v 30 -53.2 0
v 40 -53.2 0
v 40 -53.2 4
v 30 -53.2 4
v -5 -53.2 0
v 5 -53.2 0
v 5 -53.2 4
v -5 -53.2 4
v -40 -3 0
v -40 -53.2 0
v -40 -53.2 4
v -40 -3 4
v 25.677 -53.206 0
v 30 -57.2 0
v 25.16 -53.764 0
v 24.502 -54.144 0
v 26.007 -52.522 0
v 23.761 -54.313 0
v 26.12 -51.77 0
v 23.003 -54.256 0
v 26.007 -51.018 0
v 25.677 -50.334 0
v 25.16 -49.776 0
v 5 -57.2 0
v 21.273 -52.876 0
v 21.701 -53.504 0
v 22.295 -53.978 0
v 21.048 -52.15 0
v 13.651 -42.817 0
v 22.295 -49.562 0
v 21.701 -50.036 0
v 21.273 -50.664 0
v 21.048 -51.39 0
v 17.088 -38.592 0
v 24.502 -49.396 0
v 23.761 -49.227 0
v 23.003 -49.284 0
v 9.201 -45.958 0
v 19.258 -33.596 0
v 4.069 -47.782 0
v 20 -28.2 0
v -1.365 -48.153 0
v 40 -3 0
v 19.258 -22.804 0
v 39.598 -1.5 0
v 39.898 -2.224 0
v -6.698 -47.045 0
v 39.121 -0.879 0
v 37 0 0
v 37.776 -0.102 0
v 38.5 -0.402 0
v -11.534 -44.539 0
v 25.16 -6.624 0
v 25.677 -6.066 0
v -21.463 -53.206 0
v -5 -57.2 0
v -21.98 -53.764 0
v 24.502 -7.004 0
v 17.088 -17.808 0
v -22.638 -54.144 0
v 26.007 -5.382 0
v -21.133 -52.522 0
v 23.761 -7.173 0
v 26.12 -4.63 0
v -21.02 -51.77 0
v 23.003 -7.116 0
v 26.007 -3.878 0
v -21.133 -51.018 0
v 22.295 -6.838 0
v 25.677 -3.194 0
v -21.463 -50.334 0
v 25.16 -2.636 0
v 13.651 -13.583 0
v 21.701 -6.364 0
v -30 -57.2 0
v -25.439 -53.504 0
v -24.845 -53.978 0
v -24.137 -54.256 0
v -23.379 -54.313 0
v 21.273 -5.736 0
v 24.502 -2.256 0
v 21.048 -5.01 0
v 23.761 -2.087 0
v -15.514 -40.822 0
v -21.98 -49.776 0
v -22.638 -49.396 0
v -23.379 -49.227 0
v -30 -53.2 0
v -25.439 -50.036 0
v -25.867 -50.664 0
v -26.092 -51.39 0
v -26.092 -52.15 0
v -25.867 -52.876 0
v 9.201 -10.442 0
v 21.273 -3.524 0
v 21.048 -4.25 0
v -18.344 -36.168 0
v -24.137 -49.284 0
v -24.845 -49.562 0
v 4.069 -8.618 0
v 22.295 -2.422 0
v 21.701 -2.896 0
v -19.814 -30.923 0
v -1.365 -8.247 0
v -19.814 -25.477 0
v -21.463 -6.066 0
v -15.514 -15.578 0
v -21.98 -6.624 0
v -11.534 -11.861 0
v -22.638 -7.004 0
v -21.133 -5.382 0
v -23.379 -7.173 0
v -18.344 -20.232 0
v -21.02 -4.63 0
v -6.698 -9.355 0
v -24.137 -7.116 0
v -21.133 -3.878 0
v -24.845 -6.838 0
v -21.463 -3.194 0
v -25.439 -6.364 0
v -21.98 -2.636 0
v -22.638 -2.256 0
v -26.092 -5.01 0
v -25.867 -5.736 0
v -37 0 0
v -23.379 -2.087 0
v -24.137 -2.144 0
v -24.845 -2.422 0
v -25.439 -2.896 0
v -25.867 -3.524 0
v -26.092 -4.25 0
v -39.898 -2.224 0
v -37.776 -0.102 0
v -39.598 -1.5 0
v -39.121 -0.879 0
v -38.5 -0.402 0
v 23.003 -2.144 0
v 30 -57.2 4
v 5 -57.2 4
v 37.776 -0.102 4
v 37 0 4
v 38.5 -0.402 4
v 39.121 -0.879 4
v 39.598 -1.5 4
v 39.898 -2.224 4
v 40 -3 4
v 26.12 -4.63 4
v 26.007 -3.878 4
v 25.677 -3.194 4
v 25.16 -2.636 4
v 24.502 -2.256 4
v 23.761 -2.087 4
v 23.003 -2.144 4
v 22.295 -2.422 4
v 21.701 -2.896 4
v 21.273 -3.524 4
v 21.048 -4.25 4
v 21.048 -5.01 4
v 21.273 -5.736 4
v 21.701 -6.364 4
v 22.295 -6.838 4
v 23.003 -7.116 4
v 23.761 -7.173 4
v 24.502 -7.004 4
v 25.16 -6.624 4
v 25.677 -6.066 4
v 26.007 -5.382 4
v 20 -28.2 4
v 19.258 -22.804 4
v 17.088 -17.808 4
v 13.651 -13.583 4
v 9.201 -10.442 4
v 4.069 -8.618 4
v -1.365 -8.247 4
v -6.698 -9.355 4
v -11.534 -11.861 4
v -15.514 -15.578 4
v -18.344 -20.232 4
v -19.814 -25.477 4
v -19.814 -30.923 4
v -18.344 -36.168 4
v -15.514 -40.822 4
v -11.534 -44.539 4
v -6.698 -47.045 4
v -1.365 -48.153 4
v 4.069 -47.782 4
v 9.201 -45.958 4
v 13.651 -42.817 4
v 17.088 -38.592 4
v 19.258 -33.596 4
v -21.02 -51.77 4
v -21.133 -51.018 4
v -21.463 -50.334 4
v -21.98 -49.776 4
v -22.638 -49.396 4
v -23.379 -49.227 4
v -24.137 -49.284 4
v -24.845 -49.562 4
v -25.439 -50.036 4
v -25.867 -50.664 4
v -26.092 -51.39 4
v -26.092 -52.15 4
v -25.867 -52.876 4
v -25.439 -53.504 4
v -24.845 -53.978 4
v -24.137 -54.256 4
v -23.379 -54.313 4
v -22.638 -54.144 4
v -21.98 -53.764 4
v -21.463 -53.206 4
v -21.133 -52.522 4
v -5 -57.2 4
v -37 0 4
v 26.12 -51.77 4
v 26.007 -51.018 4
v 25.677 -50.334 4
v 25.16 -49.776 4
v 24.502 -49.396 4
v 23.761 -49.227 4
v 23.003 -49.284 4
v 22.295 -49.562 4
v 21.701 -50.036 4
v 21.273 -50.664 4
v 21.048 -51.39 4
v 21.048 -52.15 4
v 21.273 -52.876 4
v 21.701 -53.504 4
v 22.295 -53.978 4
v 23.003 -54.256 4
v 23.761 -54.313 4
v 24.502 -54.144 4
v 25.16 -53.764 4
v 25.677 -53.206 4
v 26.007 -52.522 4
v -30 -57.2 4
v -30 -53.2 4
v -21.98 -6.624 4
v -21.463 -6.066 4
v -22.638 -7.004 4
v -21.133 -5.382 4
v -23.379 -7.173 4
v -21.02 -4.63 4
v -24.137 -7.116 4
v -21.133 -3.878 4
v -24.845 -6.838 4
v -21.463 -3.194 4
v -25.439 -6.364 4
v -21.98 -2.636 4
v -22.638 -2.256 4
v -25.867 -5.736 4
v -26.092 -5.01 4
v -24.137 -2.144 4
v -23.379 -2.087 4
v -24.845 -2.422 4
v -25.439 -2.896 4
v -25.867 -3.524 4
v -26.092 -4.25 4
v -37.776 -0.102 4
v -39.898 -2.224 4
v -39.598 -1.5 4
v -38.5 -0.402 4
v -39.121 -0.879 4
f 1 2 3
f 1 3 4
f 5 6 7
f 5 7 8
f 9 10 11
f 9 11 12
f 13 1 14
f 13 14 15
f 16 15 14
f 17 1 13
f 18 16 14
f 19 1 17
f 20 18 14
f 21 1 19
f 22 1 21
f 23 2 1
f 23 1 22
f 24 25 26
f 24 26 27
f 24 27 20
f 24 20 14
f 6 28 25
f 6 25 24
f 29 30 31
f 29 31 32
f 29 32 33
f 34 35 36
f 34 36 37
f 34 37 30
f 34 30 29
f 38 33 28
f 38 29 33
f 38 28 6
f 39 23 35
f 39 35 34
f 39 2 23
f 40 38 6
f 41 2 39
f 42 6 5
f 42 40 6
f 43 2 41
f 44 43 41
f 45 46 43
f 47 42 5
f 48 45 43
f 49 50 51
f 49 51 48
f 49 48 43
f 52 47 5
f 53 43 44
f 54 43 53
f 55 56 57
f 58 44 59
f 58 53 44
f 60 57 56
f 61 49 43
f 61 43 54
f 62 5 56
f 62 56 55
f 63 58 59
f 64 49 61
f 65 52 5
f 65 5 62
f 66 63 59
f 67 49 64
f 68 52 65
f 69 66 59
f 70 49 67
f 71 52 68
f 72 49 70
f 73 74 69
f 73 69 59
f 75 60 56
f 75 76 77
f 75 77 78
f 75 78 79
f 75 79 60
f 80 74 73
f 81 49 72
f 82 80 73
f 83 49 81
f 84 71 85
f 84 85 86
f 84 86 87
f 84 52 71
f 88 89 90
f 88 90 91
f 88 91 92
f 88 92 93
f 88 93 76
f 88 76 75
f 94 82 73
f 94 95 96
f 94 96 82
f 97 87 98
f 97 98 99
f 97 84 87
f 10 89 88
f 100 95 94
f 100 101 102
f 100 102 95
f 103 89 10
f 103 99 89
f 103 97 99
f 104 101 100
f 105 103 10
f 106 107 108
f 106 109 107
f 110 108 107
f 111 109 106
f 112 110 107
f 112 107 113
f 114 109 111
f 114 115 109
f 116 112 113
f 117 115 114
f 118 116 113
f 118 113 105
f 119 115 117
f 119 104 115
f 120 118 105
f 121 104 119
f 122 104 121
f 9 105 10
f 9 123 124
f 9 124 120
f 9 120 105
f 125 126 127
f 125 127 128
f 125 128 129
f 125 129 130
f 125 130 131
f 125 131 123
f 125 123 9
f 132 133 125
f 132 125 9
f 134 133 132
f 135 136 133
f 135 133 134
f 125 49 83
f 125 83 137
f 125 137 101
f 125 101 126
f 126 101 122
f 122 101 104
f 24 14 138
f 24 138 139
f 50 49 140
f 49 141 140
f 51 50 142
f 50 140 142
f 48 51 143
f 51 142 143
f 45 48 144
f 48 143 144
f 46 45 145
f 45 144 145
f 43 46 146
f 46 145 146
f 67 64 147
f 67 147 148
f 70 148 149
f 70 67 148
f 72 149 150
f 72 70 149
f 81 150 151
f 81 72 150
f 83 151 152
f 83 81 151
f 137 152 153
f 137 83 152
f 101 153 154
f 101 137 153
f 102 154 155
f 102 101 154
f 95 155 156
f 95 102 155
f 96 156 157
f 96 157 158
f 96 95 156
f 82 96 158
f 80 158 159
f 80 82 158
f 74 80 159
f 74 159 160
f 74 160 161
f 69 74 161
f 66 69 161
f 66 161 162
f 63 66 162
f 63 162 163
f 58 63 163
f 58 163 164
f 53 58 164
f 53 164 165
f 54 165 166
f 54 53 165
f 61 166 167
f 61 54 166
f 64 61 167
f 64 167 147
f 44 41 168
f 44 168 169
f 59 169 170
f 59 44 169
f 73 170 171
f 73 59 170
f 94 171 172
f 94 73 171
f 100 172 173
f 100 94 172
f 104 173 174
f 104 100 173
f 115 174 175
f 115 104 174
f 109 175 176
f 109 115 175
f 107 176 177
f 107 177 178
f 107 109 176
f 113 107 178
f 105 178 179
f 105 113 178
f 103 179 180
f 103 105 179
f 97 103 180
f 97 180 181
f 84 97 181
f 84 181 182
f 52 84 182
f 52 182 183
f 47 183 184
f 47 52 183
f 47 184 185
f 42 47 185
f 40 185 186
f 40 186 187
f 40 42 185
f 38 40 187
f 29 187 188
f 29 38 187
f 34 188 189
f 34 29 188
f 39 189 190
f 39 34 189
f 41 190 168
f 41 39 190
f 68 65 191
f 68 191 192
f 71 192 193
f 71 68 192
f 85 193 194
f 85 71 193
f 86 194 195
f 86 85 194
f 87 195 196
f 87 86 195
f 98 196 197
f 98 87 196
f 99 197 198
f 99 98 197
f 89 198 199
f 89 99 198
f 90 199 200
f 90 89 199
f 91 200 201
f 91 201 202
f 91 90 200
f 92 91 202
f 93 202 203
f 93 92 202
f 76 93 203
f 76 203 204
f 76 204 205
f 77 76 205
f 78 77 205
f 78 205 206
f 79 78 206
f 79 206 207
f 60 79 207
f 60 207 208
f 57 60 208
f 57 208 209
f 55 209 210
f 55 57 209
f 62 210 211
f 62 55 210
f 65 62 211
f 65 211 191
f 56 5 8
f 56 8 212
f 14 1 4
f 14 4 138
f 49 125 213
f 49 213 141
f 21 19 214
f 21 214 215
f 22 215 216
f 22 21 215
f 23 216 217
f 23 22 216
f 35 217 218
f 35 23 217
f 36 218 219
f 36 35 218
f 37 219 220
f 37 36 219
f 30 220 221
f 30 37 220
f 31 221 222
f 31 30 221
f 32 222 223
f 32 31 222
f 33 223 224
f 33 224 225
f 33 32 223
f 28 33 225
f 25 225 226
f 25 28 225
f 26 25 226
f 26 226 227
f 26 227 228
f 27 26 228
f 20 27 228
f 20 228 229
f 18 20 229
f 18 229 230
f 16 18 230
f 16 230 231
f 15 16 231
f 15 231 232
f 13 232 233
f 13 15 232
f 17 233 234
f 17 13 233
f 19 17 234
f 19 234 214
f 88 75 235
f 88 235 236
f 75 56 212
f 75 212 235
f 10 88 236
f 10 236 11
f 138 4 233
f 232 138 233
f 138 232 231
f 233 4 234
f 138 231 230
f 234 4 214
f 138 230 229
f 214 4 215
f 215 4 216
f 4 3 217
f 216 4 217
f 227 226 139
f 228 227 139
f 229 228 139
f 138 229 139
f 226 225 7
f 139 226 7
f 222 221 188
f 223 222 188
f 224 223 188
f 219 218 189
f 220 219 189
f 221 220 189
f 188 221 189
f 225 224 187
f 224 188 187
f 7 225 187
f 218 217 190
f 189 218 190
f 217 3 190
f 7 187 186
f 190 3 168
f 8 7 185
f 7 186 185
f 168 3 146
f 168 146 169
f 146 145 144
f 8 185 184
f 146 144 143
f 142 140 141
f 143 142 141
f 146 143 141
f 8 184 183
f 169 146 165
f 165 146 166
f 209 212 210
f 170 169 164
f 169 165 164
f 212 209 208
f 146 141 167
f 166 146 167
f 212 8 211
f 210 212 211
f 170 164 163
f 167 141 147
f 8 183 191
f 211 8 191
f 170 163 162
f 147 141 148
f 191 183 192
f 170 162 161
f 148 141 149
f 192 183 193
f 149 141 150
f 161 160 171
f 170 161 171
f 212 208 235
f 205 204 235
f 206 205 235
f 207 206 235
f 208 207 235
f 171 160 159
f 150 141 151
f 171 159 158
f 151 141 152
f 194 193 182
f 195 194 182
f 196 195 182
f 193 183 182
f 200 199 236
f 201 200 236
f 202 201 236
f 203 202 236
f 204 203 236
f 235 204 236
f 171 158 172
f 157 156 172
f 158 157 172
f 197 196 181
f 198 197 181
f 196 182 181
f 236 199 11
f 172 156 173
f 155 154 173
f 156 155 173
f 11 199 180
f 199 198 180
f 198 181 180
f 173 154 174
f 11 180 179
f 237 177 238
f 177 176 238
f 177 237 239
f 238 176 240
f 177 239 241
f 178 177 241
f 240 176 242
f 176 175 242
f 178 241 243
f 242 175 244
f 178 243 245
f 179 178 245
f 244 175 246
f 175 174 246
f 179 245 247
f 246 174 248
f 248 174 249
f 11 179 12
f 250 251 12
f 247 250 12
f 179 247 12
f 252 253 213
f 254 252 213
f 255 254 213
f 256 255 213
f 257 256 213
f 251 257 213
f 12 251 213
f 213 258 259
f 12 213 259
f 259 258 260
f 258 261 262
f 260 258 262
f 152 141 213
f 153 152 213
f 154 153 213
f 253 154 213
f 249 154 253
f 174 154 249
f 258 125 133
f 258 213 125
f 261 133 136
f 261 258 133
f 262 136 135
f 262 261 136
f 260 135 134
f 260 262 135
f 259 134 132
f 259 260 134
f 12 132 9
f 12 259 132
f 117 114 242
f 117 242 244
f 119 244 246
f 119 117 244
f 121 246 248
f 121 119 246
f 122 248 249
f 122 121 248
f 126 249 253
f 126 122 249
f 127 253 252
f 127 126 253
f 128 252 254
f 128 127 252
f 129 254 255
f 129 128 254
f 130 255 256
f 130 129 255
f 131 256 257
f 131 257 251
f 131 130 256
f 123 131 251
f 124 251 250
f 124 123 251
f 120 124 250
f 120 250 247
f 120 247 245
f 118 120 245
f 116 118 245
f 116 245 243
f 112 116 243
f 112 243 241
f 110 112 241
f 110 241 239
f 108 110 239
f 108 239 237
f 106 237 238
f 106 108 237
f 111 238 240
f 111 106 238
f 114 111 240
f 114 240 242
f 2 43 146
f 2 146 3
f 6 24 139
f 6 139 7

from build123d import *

# Parameters (mm, degrees)
SKETCH_1_R      = 20
SKETCH_1_R_2    = 2.55
EXTRUDE_2_DEPTH = 4
FILLET_1_R      = 3


with BuildPart() as part:
    # Эскиз1 → Бобышка-Вытянуть2 (new body)
    with BuildSketch(Plane.XY):
        Polygon((-40, 0), (40, 0), (40, -53.2), (30, -53.2), (30, -57.2), (5, -57.2), (5, -53.2), (-5, -53.2), (-5, -57.2), (-30, -57.2), (-30, -53.2), (-40, -53.2), align=None)
        with Locations((0, -28.2)):
            Circle(SKETCH_1_R, mode=Mode.SUBTRACT)
        with Locations((-23.57, -4.63)):
            Circle(SKETCH_1_R_2, mode=Mode.SUBTRACT)
        with Locations((23.57, -4.63)):
            Circle(SKETCH_1_R_2, mode=Mode.SUBTRACT)
        with Locations((23.57, -51.77)):
            Circle(SKETCH_1_R_2, mode=Mode.SUBTRACT)
        with Locations((-23.57, -51.77)):
            Circle(SKETCH_1_R_2, mode=Mode.SUBTRACT)
    extrude(amount=EXTRUDE_2_DEPTH)

    # Скругление1
    fillet_1_edges = [part.edges().sort_by_distance(p)[0] for p in [
        (-40, 0, 2),
        (40, 0, 2),
    ]]
    fillet(fillet_1_edges, radius=FILLET_1_R)


solid = part.part
